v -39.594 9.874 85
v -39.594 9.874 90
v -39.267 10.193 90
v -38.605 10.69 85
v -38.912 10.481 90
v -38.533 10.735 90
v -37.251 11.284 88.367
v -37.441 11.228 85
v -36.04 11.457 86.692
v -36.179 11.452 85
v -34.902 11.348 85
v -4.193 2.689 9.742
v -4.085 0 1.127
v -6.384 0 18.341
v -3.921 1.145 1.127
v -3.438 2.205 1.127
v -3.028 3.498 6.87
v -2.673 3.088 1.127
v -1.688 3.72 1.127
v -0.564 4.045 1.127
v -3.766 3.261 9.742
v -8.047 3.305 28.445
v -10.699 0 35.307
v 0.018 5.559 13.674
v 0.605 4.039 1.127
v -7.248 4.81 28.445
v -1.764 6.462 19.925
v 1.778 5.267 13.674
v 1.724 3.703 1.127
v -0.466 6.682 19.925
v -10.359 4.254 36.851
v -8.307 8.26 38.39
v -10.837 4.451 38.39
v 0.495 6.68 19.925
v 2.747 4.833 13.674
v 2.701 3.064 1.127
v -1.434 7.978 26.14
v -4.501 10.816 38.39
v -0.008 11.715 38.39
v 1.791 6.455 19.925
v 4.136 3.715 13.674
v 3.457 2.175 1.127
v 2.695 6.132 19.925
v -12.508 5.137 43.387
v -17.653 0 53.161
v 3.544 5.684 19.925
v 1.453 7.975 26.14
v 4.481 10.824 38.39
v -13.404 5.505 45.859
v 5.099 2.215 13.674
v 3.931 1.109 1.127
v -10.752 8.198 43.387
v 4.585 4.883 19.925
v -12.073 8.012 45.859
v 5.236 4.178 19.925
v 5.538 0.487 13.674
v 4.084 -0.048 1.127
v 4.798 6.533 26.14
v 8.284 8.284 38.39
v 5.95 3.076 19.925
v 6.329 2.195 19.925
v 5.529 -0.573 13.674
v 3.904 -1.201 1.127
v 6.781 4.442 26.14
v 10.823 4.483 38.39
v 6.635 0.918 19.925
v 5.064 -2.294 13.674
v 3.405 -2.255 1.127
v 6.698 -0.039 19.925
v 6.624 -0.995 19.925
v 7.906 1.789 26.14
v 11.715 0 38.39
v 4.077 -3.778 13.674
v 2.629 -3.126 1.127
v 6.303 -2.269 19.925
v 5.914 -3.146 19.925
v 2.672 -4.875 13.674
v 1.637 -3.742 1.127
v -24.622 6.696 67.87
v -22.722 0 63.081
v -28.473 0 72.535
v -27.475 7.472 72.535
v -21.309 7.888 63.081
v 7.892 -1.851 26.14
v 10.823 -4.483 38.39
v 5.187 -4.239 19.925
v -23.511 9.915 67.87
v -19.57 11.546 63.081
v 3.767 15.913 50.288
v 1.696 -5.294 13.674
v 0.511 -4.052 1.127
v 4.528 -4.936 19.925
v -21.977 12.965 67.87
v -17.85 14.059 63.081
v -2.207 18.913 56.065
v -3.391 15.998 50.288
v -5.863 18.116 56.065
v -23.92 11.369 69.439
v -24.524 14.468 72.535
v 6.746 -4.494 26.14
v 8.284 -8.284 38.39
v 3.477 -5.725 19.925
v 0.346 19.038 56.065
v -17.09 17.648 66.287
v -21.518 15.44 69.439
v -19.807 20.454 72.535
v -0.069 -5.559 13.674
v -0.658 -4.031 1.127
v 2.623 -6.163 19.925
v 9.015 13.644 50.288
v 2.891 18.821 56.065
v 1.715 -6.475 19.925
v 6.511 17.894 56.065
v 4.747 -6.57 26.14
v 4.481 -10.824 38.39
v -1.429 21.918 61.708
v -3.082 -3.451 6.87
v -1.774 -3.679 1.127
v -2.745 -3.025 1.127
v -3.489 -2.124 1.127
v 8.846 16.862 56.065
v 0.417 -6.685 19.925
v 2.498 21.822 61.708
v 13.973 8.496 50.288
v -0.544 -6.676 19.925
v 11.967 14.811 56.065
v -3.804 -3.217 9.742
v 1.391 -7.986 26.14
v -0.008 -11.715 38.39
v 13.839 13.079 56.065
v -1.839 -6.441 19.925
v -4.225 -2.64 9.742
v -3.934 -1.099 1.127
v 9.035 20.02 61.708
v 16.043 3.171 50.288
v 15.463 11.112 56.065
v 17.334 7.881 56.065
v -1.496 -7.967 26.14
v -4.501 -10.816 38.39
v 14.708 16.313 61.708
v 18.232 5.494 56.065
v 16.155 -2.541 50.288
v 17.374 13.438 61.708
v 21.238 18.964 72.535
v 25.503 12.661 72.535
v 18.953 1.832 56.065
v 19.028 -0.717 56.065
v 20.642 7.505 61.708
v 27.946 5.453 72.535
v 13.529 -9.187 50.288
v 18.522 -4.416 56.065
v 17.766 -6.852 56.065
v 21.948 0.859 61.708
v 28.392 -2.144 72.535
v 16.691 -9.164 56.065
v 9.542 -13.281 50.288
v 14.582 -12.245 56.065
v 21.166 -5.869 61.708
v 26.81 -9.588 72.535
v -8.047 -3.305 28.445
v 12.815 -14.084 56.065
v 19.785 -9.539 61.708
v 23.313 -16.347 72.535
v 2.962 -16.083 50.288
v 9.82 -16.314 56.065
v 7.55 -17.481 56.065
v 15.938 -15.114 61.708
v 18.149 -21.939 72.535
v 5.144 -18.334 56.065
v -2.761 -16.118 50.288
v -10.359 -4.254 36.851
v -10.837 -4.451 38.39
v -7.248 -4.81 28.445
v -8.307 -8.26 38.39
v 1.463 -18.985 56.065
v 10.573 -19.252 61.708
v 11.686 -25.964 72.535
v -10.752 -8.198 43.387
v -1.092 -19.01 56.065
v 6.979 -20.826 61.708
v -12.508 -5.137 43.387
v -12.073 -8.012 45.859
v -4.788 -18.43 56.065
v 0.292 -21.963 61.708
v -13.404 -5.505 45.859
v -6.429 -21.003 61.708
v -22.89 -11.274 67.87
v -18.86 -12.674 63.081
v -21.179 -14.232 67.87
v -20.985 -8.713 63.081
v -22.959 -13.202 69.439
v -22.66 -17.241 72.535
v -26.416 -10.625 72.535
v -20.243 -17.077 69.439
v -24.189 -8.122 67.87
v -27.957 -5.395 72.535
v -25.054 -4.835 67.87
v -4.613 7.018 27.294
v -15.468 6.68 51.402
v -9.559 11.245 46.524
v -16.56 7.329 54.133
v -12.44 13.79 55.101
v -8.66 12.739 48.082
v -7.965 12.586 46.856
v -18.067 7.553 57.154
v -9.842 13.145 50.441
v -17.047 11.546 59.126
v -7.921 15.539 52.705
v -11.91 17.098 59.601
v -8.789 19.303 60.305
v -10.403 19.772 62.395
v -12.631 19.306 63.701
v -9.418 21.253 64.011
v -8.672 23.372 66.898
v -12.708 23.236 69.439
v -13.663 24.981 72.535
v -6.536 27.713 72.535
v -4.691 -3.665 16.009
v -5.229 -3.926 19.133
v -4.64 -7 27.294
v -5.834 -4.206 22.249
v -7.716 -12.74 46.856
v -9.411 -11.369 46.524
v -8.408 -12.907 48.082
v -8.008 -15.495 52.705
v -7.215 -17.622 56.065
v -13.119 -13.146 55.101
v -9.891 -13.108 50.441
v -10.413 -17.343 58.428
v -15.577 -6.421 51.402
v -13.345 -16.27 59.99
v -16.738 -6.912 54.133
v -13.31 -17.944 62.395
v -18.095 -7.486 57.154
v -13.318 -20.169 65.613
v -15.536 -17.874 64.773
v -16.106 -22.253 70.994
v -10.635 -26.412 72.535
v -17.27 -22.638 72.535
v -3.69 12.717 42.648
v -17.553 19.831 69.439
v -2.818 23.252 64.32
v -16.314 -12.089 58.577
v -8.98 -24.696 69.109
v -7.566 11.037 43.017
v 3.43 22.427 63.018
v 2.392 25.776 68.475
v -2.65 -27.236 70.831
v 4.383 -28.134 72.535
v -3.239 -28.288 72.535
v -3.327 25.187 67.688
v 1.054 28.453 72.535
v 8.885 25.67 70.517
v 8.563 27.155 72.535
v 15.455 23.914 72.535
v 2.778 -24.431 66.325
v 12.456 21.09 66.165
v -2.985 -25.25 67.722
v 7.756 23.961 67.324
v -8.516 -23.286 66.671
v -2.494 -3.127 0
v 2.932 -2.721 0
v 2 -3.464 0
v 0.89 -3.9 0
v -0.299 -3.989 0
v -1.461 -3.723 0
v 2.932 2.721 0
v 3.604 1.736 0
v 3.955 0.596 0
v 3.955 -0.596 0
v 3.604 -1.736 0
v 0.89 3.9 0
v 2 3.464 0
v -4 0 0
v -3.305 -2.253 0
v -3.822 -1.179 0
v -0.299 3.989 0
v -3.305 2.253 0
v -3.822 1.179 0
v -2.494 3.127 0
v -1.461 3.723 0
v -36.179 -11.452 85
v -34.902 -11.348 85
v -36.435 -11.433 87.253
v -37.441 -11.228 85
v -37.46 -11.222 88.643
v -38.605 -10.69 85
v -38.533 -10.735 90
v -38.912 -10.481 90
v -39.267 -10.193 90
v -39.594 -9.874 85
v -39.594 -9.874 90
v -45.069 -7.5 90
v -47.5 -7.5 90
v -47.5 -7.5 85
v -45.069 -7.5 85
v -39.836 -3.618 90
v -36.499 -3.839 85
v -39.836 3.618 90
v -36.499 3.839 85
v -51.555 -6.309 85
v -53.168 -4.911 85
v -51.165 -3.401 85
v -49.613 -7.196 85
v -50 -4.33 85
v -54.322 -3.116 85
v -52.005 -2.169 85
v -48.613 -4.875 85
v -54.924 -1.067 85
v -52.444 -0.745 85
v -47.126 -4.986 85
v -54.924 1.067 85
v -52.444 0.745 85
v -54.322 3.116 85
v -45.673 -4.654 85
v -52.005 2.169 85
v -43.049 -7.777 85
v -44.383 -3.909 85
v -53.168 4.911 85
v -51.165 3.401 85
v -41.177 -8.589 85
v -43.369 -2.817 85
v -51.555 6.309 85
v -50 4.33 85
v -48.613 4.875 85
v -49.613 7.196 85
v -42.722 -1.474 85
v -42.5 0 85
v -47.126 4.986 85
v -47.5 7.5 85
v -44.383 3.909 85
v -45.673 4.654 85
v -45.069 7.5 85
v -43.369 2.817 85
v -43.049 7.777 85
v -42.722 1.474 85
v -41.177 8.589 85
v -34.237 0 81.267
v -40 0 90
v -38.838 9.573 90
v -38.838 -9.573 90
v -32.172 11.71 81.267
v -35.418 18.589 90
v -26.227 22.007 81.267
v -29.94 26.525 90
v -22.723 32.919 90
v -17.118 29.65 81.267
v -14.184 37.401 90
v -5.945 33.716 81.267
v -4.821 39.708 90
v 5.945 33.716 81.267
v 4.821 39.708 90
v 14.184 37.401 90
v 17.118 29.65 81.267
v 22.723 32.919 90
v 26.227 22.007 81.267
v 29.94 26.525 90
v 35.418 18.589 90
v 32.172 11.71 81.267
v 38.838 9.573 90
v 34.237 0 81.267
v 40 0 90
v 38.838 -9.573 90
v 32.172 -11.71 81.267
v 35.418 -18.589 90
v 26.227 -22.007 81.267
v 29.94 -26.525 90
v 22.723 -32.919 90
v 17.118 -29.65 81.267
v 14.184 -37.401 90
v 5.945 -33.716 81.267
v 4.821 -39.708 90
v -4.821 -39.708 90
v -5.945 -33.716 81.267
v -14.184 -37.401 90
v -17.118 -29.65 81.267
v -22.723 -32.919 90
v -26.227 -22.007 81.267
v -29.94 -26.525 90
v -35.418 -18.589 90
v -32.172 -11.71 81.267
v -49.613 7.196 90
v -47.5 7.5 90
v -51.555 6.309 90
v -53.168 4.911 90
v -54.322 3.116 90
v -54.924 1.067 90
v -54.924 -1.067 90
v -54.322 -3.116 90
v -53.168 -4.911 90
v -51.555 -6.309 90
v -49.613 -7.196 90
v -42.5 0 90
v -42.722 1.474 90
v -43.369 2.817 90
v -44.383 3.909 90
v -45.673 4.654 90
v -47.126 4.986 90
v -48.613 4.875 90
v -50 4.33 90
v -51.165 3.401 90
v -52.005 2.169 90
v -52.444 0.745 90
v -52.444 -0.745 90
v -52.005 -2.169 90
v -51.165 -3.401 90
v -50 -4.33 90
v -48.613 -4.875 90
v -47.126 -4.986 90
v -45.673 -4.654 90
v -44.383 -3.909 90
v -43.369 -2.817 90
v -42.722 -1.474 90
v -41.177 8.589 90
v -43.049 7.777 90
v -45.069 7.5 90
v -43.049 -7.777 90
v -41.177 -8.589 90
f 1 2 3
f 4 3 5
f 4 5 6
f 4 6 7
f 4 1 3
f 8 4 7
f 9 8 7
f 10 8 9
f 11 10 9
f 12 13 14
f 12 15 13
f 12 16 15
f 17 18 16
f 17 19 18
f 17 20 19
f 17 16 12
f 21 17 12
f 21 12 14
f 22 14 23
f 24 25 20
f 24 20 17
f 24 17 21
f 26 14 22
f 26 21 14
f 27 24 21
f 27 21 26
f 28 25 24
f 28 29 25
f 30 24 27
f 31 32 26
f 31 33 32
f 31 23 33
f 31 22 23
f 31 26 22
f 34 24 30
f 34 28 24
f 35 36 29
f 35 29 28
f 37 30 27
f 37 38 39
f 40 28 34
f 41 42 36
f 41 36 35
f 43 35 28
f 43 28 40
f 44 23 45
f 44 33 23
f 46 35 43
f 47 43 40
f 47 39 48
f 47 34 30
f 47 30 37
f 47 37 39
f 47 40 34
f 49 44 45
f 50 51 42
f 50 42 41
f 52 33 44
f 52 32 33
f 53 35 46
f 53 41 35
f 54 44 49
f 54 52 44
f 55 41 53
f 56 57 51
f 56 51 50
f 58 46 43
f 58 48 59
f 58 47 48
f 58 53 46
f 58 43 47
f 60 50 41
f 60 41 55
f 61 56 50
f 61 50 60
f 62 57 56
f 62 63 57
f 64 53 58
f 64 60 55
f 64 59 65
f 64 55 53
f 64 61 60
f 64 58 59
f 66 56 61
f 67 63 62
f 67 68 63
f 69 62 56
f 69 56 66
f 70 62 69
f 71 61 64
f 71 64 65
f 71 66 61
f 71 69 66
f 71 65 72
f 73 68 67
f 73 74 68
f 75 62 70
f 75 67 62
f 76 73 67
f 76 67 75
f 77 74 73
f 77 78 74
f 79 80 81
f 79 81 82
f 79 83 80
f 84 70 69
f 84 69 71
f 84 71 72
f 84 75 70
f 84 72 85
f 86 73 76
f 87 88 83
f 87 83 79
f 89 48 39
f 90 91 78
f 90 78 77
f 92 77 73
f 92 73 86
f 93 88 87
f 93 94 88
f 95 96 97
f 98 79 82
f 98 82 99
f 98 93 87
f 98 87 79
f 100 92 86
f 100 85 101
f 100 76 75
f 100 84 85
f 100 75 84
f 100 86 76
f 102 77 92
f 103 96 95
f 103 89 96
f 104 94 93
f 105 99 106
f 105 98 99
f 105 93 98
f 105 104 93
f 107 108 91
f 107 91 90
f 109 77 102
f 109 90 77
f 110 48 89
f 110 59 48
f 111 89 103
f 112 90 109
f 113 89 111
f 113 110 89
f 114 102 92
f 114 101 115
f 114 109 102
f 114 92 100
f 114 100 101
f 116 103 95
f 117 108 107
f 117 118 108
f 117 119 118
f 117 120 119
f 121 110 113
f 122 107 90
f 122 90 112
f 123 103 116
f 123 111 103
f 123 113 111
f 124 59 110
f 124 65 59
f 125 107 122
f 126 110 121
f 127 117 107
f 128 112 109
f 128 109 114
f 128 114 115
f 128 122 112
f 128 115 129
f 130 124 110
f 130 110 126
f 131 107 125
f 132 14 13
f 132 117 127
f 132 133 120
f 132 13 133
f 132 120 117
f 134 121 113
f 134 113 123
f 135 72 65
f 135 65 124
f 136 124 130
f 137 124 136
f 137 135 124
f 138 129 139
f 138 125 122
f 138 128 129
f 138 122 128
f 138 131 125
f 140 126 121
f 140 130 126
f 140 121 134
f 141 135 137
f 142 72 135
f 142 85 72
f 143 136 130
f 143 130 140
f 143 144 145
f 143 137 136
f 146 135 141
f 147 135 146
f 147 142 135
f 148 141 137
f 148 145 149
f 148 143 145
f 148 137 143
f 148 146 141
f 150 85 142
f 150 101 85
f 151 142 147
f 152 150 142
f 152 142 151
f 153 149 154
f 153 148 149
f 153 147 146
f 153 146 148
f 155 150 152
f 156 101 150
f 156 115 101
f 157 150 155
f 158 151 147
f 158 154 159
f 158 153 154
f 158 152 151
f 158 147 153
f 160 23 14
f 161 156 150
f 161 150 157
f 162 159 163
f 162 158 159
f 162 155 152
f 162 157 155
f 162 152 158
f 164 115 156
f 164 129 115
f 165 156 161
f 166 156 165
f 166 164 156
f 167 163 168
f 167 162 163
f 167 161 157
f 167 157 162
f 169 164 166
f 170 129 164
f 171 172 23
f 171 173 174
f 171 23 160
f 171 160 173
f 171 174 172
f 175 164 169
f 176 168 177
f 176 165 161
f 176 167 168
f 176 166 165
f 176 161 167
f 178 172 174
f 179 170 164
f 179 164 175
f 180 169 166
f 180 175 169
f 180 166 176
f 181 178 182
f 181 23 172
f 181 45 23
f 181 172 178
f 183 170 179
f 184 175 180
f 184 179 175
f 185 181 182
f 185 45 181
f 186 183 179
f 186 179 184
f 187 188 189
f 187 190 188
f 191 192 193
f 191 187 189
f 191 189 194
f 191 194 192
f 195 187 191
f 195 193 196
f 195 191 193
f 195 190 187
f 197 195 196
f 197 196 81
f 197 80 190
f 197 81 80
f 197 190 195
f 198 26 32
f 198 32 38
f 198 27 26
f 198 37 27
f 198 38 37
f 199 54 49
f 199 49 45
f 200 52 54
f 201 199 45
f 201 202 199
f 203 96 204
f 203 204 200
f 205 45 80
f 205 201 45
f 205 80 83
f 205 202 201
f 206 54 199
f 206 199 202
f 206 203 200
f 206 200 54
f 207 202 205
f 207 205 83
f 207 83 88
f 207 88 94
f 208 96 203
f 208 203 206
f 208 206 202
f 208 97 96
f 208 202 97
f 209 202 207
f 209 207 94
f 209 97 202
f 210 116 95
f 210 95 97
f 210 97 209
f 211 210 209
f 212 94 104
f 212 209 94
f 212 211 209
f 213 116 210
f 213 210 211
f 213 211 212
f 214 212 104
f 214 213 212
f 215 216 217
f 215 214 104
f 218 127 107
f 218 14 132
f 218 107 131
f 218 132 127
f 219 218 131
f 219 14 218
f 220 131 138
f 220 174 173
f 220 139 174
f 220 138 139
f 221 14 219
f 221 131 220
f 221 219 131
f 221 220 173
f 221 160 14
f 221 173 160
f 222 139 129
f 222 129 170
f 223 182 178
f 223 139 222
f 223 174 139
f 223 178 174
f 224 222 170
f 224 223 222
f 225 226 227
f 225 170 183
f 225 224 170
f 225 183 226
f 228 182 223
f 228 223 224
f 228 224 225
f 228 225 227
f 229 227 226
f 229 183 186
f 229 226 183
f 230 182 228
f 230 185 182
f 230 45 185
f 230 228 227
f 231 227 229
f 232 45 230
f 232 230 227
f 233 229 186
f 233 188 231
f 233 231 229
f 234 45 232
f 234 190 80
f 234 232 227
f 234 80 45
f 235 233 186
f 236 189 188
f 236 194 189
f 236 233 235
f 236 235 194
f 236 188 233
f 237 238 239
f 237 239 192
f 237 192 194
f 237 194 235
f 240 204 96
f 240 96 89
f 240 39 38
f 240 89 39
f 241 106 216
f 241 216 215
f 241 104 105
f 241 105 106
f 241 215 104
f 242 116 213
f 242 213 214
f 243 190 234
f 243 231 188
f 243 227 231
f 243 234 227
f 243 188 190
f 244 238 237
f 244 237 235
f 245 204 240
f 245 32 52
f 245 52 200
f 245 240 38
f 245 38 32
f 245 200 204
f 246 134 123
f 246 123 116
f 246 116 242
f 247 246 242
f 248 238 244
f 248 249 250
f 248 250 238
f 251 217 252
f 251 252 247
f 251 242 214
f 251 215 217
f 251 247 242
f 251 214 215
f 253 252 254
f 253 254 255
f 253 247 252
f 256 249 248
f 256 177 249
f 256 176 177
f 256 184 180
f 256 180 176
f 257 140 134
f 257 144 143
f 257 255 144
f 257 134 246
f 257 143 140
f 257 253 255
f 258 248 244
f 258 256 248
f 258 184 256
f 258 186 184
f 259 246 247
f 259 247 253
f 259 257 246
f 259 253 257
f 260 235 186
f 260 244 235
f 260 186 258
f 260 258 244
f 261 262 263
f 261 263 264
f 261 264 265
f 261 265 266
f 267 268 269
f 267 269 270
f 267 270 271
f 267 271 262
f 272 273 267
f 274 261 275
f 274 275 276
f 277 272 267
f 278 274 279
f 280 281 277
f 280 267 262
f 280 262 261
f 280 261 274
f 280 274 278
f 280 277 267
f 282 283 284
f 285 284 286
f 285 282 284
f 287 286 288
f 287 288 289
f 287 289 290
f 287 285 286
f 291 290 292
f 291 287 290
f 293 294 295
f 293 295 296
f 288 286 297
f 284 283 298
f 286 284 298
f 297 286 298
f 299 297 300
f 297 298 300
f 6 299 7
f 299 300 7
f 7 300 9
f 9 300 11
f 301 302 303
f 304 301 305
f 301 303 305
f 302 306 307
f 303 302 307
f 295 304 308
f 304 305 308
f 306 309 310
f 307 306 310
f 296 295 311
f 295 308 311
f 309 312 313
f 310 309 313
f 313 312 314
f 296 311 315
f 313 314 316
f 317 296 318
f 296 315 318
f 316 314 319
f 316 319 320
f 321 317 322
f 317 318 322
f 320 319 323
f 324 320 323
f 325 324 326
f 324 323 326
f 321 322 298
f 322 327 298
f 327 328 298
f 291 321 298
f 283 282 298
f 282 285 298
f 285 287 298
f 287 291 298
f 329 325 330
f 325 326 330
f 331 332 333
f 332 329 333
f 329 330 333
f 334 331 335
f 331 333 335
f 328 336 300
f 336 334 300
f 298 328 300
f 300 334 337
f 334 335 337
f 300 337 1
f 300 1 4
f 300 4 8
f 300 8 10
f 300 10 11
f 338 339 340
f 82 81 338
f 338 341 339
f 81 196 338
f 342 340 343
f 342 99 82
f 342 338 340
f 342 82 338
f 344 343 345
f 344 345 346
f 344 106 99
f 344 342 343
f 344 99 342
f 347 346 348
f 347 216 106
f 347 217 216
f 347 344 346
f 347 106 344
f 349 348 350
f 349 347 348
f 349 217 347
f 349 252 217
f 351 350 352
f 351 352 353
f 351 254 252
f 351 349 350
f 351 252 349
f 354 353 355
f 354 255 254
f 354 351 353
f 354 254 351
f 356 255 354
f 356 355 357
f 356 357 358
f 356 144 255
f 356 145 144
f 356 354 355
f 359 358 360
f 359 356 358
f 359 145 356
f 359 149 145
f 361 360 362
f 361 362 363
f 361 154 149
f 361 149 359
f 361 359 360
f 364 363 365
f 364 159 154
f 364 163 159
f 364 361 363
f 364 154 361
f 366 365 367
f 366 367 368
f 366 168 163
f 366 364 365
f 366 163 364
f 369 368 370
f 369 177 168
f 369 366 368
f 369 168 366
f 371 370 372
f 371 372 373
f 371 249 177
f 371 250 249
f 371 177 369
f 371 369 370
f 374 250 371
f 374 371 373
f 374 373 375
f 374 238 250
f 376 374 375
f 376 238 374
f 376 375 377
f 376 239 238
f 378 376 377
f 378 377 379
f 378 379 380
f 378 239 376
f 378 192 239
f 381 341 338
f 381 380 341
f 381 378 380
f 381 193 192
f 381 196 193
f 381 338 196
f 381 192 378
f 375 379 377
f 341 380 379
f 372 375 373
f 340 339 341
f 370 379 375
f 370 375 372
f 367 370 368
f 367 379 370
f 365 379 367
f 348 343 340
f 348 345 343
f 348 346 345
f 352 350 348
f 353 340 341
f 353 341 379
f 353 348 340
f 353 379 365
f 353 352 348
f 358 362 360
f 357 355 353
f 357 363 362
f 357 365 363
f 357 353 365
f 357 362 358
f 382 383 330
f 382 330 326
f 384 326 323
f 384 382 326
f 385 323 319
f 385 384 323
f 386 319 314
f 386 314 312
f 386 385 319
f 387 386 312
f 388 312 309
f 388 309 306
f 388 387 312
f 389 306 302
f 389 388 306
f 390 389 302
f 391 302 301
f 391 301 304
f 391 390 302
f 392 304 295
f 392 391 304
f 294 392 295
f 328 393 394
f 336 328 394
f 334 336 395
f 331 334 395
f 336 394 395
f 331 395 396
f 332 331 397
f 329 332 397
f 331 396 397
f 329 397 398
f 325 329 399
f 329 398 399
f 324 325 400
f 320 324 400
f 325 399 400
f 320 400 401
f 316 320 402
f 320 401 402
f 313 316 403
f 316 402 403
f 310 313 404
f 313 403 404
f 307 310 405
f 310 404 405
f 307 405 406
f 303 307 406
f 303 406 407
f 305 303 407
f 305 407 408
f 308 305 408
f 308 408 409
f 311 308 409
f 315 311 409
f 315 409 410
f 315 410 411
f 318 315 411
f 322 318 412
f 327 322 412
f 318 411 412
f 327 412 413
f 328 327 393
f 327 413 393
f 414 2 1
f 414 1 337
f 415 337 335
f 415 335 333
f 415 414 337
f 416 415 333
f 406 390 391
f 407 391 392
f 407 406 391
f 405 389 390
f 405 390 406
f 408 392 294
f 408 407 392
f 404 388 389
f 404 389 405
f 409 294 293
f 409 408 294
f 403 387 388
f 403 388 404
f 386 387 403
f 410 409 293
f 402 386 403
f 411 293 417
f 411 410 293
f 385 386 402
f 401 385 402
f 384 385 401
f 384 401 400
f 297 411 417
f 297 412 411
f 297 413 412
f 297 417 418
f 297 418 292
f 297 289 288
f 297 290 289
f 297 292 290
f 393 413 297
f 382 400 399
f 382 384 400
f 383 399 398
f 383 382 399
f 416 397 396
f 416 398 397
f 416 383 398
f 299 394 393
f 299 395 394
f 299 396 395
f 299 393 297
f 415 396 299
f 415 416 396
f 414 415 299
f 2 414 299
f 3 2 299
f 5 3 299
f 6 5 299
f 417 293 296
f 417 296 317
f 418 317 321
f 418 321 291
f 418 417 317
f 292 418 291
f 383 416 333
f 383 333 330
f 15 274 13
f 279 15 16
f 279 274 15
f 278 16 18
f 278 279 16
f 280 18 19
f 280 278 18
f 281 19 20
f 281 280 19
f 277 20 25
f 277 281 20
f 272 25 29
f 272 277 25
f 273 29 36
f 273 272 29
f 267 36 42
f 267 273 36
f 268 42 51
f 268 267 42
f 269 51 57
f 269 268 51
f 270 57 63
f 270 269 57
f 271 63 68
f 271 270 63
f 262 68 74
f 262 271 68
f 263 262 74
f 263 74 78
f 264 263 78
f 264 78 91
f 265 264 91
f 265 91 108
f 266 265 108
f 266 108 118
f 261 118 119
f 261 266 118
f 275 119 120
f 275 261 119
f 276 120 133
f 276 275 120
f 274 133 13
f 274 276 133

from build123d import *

# Parameters (mm, degrees)
F2_R        = 150
F3_R        = 5
F4_DEPTH    = 5
F6_T1_DEPTH = 25.7103664143


# Not quite as in the source:
# - a fillet or chamfer that OpenCascade refuses, or shapes differently, is made with other operations: its cross-section is extruded or revolved along the edge and cut away or added


with BuildPart() as f1:
    # F0 (on Front) → F1 (revolve)
    with BuildSketch(Plane.XZ):
        Polygon((-7, 40), (-4, 0), (0, 0), (0, 90), (-40, 90), align=None)
    revolve(axis=Axis((0, 0, 45), (0, 0, -1)))

    # F2
    f2_edges = [f1.edges().sort_by_distance(p)[0] for p in [
        (7, 0, 40),
    ]]
    fillet(f2_edges, radius=F2_R)


with BuildPart() as f4:
    # F3 (on face) → F4 (new body)
    with BuildSketch(Plane.XY.offset(90)):
        with BuildLine():
            Line((-45.0693909433, 7.5), (-47.5, 7.5))
            ThreePointArc((-47.5, 7.5), (-52.8033008589, 5.3033008589), (-55, 0))
            ThreePointArc((-55, 0), (-52.8033008589, -5.3033008589), (-47.5, -7.5))
            Line((-47.5, -7.5), (-45.0693909433, -7.5))
            ThreePointArc((-45.0693909433, -7.5), (-40.6826585543, -8.9166967076), (-37.9531713207, -12.6315789474))
            ThreePointArc((-37.9531713207, -12.6315789474), (-38.707011174, -10.0879772984), (-39.2905841138, -7.5))
            ThreePointArc((-39.2905841138, -7.5), (-40, 0), (-39.2905841138, 7.5))
            ThreePointArc((-39.2905841138, 7.5), (-38.707011174, 10.0879772984), (-37.9531713207, 12.6315789474))
            ThreePointArc((-37.9531713207, 12.6315789474), (-40.6826585543, 8.9166967076), (-45.0693909433, 7.5))
        make_face()
        with Locations((-47.5, 0)):
            Circle(F3_R, mode=Mode.SUBTRACT)
        with BuildLine():
            Line((-25, 7.5), (-37.9531713207, 12.6315789474))
            ThreePointArc((-37.9531713207, 12.6315789474), (-38.707011174, 10.0879772984), (-39.2905841138, 7.5))
            ThreePointArc((-39.2905841138, 7.5), (-40, 0), (-39.2905841138, -7.5))
            ThreePointArc((-39.2905841138, -7.5), (-38.707011174, -10.0879772984), (-37.9531713207, -12.6315789474))
            Line((-37.9531713207, -12.6315789474), (-25, -7.5))
            Line((-25, -7.5), (-25, 7.5))
        make_face()
    extrude(amount=-F4_DEPTH)

    # F0 (on Front) → F5 (revolve, cut)
    with BuildSketch(Plane.XZ):
        Polygon((-7, 40), (-4, 0), (0, 0), (0, 90), (-40, 90), align=None)
    revolve(axis=Axis((0, 0, 45), (0, 0, -1)), mode=Mode.SUBTRACT)

    # F6: fillet of radius 5 on 2 edges, made by hand

    # F6_s2 → F6_t1 (cut)
    with BuildSketch(Plane.XY.offset(74.6448167928)):
        with BuildLine():
            ThreePointArc((-34.102279986, -11.1059947941), (-37.0379022892, -11.33632485), (-39.5940667848, -9.874492673))
            ThreePointArc((-39.5940667848, -9.874492673), (-38.6244607746, -11.1642634187), (-37.9531713207, -12.6315789474))
            Line((-37.9531713207, -12.6315789474), (-34.102279986, -11.1059947941))
        make_face()
        with BuildLine():
            ThreePointArc((-39.5940667848, 9.874492673), (-37.0379022892, 11.33632485), (-34.102279986, 11.1059947941))
            Line((-34.102279986, 11.1059947941), (-37.9531713207, 12.6315789474))
            ThreePointArc((-37.9531713207, 12.6315789474), (-38.6244607746, 11.1642634187), (-39.5940667848, 9.874492673))
        make_face()
    extrude(amount=F6_T1_DEPTH, mode=Mode.SUBTRACT)


solid = Compound([f1.part, f4.part])
